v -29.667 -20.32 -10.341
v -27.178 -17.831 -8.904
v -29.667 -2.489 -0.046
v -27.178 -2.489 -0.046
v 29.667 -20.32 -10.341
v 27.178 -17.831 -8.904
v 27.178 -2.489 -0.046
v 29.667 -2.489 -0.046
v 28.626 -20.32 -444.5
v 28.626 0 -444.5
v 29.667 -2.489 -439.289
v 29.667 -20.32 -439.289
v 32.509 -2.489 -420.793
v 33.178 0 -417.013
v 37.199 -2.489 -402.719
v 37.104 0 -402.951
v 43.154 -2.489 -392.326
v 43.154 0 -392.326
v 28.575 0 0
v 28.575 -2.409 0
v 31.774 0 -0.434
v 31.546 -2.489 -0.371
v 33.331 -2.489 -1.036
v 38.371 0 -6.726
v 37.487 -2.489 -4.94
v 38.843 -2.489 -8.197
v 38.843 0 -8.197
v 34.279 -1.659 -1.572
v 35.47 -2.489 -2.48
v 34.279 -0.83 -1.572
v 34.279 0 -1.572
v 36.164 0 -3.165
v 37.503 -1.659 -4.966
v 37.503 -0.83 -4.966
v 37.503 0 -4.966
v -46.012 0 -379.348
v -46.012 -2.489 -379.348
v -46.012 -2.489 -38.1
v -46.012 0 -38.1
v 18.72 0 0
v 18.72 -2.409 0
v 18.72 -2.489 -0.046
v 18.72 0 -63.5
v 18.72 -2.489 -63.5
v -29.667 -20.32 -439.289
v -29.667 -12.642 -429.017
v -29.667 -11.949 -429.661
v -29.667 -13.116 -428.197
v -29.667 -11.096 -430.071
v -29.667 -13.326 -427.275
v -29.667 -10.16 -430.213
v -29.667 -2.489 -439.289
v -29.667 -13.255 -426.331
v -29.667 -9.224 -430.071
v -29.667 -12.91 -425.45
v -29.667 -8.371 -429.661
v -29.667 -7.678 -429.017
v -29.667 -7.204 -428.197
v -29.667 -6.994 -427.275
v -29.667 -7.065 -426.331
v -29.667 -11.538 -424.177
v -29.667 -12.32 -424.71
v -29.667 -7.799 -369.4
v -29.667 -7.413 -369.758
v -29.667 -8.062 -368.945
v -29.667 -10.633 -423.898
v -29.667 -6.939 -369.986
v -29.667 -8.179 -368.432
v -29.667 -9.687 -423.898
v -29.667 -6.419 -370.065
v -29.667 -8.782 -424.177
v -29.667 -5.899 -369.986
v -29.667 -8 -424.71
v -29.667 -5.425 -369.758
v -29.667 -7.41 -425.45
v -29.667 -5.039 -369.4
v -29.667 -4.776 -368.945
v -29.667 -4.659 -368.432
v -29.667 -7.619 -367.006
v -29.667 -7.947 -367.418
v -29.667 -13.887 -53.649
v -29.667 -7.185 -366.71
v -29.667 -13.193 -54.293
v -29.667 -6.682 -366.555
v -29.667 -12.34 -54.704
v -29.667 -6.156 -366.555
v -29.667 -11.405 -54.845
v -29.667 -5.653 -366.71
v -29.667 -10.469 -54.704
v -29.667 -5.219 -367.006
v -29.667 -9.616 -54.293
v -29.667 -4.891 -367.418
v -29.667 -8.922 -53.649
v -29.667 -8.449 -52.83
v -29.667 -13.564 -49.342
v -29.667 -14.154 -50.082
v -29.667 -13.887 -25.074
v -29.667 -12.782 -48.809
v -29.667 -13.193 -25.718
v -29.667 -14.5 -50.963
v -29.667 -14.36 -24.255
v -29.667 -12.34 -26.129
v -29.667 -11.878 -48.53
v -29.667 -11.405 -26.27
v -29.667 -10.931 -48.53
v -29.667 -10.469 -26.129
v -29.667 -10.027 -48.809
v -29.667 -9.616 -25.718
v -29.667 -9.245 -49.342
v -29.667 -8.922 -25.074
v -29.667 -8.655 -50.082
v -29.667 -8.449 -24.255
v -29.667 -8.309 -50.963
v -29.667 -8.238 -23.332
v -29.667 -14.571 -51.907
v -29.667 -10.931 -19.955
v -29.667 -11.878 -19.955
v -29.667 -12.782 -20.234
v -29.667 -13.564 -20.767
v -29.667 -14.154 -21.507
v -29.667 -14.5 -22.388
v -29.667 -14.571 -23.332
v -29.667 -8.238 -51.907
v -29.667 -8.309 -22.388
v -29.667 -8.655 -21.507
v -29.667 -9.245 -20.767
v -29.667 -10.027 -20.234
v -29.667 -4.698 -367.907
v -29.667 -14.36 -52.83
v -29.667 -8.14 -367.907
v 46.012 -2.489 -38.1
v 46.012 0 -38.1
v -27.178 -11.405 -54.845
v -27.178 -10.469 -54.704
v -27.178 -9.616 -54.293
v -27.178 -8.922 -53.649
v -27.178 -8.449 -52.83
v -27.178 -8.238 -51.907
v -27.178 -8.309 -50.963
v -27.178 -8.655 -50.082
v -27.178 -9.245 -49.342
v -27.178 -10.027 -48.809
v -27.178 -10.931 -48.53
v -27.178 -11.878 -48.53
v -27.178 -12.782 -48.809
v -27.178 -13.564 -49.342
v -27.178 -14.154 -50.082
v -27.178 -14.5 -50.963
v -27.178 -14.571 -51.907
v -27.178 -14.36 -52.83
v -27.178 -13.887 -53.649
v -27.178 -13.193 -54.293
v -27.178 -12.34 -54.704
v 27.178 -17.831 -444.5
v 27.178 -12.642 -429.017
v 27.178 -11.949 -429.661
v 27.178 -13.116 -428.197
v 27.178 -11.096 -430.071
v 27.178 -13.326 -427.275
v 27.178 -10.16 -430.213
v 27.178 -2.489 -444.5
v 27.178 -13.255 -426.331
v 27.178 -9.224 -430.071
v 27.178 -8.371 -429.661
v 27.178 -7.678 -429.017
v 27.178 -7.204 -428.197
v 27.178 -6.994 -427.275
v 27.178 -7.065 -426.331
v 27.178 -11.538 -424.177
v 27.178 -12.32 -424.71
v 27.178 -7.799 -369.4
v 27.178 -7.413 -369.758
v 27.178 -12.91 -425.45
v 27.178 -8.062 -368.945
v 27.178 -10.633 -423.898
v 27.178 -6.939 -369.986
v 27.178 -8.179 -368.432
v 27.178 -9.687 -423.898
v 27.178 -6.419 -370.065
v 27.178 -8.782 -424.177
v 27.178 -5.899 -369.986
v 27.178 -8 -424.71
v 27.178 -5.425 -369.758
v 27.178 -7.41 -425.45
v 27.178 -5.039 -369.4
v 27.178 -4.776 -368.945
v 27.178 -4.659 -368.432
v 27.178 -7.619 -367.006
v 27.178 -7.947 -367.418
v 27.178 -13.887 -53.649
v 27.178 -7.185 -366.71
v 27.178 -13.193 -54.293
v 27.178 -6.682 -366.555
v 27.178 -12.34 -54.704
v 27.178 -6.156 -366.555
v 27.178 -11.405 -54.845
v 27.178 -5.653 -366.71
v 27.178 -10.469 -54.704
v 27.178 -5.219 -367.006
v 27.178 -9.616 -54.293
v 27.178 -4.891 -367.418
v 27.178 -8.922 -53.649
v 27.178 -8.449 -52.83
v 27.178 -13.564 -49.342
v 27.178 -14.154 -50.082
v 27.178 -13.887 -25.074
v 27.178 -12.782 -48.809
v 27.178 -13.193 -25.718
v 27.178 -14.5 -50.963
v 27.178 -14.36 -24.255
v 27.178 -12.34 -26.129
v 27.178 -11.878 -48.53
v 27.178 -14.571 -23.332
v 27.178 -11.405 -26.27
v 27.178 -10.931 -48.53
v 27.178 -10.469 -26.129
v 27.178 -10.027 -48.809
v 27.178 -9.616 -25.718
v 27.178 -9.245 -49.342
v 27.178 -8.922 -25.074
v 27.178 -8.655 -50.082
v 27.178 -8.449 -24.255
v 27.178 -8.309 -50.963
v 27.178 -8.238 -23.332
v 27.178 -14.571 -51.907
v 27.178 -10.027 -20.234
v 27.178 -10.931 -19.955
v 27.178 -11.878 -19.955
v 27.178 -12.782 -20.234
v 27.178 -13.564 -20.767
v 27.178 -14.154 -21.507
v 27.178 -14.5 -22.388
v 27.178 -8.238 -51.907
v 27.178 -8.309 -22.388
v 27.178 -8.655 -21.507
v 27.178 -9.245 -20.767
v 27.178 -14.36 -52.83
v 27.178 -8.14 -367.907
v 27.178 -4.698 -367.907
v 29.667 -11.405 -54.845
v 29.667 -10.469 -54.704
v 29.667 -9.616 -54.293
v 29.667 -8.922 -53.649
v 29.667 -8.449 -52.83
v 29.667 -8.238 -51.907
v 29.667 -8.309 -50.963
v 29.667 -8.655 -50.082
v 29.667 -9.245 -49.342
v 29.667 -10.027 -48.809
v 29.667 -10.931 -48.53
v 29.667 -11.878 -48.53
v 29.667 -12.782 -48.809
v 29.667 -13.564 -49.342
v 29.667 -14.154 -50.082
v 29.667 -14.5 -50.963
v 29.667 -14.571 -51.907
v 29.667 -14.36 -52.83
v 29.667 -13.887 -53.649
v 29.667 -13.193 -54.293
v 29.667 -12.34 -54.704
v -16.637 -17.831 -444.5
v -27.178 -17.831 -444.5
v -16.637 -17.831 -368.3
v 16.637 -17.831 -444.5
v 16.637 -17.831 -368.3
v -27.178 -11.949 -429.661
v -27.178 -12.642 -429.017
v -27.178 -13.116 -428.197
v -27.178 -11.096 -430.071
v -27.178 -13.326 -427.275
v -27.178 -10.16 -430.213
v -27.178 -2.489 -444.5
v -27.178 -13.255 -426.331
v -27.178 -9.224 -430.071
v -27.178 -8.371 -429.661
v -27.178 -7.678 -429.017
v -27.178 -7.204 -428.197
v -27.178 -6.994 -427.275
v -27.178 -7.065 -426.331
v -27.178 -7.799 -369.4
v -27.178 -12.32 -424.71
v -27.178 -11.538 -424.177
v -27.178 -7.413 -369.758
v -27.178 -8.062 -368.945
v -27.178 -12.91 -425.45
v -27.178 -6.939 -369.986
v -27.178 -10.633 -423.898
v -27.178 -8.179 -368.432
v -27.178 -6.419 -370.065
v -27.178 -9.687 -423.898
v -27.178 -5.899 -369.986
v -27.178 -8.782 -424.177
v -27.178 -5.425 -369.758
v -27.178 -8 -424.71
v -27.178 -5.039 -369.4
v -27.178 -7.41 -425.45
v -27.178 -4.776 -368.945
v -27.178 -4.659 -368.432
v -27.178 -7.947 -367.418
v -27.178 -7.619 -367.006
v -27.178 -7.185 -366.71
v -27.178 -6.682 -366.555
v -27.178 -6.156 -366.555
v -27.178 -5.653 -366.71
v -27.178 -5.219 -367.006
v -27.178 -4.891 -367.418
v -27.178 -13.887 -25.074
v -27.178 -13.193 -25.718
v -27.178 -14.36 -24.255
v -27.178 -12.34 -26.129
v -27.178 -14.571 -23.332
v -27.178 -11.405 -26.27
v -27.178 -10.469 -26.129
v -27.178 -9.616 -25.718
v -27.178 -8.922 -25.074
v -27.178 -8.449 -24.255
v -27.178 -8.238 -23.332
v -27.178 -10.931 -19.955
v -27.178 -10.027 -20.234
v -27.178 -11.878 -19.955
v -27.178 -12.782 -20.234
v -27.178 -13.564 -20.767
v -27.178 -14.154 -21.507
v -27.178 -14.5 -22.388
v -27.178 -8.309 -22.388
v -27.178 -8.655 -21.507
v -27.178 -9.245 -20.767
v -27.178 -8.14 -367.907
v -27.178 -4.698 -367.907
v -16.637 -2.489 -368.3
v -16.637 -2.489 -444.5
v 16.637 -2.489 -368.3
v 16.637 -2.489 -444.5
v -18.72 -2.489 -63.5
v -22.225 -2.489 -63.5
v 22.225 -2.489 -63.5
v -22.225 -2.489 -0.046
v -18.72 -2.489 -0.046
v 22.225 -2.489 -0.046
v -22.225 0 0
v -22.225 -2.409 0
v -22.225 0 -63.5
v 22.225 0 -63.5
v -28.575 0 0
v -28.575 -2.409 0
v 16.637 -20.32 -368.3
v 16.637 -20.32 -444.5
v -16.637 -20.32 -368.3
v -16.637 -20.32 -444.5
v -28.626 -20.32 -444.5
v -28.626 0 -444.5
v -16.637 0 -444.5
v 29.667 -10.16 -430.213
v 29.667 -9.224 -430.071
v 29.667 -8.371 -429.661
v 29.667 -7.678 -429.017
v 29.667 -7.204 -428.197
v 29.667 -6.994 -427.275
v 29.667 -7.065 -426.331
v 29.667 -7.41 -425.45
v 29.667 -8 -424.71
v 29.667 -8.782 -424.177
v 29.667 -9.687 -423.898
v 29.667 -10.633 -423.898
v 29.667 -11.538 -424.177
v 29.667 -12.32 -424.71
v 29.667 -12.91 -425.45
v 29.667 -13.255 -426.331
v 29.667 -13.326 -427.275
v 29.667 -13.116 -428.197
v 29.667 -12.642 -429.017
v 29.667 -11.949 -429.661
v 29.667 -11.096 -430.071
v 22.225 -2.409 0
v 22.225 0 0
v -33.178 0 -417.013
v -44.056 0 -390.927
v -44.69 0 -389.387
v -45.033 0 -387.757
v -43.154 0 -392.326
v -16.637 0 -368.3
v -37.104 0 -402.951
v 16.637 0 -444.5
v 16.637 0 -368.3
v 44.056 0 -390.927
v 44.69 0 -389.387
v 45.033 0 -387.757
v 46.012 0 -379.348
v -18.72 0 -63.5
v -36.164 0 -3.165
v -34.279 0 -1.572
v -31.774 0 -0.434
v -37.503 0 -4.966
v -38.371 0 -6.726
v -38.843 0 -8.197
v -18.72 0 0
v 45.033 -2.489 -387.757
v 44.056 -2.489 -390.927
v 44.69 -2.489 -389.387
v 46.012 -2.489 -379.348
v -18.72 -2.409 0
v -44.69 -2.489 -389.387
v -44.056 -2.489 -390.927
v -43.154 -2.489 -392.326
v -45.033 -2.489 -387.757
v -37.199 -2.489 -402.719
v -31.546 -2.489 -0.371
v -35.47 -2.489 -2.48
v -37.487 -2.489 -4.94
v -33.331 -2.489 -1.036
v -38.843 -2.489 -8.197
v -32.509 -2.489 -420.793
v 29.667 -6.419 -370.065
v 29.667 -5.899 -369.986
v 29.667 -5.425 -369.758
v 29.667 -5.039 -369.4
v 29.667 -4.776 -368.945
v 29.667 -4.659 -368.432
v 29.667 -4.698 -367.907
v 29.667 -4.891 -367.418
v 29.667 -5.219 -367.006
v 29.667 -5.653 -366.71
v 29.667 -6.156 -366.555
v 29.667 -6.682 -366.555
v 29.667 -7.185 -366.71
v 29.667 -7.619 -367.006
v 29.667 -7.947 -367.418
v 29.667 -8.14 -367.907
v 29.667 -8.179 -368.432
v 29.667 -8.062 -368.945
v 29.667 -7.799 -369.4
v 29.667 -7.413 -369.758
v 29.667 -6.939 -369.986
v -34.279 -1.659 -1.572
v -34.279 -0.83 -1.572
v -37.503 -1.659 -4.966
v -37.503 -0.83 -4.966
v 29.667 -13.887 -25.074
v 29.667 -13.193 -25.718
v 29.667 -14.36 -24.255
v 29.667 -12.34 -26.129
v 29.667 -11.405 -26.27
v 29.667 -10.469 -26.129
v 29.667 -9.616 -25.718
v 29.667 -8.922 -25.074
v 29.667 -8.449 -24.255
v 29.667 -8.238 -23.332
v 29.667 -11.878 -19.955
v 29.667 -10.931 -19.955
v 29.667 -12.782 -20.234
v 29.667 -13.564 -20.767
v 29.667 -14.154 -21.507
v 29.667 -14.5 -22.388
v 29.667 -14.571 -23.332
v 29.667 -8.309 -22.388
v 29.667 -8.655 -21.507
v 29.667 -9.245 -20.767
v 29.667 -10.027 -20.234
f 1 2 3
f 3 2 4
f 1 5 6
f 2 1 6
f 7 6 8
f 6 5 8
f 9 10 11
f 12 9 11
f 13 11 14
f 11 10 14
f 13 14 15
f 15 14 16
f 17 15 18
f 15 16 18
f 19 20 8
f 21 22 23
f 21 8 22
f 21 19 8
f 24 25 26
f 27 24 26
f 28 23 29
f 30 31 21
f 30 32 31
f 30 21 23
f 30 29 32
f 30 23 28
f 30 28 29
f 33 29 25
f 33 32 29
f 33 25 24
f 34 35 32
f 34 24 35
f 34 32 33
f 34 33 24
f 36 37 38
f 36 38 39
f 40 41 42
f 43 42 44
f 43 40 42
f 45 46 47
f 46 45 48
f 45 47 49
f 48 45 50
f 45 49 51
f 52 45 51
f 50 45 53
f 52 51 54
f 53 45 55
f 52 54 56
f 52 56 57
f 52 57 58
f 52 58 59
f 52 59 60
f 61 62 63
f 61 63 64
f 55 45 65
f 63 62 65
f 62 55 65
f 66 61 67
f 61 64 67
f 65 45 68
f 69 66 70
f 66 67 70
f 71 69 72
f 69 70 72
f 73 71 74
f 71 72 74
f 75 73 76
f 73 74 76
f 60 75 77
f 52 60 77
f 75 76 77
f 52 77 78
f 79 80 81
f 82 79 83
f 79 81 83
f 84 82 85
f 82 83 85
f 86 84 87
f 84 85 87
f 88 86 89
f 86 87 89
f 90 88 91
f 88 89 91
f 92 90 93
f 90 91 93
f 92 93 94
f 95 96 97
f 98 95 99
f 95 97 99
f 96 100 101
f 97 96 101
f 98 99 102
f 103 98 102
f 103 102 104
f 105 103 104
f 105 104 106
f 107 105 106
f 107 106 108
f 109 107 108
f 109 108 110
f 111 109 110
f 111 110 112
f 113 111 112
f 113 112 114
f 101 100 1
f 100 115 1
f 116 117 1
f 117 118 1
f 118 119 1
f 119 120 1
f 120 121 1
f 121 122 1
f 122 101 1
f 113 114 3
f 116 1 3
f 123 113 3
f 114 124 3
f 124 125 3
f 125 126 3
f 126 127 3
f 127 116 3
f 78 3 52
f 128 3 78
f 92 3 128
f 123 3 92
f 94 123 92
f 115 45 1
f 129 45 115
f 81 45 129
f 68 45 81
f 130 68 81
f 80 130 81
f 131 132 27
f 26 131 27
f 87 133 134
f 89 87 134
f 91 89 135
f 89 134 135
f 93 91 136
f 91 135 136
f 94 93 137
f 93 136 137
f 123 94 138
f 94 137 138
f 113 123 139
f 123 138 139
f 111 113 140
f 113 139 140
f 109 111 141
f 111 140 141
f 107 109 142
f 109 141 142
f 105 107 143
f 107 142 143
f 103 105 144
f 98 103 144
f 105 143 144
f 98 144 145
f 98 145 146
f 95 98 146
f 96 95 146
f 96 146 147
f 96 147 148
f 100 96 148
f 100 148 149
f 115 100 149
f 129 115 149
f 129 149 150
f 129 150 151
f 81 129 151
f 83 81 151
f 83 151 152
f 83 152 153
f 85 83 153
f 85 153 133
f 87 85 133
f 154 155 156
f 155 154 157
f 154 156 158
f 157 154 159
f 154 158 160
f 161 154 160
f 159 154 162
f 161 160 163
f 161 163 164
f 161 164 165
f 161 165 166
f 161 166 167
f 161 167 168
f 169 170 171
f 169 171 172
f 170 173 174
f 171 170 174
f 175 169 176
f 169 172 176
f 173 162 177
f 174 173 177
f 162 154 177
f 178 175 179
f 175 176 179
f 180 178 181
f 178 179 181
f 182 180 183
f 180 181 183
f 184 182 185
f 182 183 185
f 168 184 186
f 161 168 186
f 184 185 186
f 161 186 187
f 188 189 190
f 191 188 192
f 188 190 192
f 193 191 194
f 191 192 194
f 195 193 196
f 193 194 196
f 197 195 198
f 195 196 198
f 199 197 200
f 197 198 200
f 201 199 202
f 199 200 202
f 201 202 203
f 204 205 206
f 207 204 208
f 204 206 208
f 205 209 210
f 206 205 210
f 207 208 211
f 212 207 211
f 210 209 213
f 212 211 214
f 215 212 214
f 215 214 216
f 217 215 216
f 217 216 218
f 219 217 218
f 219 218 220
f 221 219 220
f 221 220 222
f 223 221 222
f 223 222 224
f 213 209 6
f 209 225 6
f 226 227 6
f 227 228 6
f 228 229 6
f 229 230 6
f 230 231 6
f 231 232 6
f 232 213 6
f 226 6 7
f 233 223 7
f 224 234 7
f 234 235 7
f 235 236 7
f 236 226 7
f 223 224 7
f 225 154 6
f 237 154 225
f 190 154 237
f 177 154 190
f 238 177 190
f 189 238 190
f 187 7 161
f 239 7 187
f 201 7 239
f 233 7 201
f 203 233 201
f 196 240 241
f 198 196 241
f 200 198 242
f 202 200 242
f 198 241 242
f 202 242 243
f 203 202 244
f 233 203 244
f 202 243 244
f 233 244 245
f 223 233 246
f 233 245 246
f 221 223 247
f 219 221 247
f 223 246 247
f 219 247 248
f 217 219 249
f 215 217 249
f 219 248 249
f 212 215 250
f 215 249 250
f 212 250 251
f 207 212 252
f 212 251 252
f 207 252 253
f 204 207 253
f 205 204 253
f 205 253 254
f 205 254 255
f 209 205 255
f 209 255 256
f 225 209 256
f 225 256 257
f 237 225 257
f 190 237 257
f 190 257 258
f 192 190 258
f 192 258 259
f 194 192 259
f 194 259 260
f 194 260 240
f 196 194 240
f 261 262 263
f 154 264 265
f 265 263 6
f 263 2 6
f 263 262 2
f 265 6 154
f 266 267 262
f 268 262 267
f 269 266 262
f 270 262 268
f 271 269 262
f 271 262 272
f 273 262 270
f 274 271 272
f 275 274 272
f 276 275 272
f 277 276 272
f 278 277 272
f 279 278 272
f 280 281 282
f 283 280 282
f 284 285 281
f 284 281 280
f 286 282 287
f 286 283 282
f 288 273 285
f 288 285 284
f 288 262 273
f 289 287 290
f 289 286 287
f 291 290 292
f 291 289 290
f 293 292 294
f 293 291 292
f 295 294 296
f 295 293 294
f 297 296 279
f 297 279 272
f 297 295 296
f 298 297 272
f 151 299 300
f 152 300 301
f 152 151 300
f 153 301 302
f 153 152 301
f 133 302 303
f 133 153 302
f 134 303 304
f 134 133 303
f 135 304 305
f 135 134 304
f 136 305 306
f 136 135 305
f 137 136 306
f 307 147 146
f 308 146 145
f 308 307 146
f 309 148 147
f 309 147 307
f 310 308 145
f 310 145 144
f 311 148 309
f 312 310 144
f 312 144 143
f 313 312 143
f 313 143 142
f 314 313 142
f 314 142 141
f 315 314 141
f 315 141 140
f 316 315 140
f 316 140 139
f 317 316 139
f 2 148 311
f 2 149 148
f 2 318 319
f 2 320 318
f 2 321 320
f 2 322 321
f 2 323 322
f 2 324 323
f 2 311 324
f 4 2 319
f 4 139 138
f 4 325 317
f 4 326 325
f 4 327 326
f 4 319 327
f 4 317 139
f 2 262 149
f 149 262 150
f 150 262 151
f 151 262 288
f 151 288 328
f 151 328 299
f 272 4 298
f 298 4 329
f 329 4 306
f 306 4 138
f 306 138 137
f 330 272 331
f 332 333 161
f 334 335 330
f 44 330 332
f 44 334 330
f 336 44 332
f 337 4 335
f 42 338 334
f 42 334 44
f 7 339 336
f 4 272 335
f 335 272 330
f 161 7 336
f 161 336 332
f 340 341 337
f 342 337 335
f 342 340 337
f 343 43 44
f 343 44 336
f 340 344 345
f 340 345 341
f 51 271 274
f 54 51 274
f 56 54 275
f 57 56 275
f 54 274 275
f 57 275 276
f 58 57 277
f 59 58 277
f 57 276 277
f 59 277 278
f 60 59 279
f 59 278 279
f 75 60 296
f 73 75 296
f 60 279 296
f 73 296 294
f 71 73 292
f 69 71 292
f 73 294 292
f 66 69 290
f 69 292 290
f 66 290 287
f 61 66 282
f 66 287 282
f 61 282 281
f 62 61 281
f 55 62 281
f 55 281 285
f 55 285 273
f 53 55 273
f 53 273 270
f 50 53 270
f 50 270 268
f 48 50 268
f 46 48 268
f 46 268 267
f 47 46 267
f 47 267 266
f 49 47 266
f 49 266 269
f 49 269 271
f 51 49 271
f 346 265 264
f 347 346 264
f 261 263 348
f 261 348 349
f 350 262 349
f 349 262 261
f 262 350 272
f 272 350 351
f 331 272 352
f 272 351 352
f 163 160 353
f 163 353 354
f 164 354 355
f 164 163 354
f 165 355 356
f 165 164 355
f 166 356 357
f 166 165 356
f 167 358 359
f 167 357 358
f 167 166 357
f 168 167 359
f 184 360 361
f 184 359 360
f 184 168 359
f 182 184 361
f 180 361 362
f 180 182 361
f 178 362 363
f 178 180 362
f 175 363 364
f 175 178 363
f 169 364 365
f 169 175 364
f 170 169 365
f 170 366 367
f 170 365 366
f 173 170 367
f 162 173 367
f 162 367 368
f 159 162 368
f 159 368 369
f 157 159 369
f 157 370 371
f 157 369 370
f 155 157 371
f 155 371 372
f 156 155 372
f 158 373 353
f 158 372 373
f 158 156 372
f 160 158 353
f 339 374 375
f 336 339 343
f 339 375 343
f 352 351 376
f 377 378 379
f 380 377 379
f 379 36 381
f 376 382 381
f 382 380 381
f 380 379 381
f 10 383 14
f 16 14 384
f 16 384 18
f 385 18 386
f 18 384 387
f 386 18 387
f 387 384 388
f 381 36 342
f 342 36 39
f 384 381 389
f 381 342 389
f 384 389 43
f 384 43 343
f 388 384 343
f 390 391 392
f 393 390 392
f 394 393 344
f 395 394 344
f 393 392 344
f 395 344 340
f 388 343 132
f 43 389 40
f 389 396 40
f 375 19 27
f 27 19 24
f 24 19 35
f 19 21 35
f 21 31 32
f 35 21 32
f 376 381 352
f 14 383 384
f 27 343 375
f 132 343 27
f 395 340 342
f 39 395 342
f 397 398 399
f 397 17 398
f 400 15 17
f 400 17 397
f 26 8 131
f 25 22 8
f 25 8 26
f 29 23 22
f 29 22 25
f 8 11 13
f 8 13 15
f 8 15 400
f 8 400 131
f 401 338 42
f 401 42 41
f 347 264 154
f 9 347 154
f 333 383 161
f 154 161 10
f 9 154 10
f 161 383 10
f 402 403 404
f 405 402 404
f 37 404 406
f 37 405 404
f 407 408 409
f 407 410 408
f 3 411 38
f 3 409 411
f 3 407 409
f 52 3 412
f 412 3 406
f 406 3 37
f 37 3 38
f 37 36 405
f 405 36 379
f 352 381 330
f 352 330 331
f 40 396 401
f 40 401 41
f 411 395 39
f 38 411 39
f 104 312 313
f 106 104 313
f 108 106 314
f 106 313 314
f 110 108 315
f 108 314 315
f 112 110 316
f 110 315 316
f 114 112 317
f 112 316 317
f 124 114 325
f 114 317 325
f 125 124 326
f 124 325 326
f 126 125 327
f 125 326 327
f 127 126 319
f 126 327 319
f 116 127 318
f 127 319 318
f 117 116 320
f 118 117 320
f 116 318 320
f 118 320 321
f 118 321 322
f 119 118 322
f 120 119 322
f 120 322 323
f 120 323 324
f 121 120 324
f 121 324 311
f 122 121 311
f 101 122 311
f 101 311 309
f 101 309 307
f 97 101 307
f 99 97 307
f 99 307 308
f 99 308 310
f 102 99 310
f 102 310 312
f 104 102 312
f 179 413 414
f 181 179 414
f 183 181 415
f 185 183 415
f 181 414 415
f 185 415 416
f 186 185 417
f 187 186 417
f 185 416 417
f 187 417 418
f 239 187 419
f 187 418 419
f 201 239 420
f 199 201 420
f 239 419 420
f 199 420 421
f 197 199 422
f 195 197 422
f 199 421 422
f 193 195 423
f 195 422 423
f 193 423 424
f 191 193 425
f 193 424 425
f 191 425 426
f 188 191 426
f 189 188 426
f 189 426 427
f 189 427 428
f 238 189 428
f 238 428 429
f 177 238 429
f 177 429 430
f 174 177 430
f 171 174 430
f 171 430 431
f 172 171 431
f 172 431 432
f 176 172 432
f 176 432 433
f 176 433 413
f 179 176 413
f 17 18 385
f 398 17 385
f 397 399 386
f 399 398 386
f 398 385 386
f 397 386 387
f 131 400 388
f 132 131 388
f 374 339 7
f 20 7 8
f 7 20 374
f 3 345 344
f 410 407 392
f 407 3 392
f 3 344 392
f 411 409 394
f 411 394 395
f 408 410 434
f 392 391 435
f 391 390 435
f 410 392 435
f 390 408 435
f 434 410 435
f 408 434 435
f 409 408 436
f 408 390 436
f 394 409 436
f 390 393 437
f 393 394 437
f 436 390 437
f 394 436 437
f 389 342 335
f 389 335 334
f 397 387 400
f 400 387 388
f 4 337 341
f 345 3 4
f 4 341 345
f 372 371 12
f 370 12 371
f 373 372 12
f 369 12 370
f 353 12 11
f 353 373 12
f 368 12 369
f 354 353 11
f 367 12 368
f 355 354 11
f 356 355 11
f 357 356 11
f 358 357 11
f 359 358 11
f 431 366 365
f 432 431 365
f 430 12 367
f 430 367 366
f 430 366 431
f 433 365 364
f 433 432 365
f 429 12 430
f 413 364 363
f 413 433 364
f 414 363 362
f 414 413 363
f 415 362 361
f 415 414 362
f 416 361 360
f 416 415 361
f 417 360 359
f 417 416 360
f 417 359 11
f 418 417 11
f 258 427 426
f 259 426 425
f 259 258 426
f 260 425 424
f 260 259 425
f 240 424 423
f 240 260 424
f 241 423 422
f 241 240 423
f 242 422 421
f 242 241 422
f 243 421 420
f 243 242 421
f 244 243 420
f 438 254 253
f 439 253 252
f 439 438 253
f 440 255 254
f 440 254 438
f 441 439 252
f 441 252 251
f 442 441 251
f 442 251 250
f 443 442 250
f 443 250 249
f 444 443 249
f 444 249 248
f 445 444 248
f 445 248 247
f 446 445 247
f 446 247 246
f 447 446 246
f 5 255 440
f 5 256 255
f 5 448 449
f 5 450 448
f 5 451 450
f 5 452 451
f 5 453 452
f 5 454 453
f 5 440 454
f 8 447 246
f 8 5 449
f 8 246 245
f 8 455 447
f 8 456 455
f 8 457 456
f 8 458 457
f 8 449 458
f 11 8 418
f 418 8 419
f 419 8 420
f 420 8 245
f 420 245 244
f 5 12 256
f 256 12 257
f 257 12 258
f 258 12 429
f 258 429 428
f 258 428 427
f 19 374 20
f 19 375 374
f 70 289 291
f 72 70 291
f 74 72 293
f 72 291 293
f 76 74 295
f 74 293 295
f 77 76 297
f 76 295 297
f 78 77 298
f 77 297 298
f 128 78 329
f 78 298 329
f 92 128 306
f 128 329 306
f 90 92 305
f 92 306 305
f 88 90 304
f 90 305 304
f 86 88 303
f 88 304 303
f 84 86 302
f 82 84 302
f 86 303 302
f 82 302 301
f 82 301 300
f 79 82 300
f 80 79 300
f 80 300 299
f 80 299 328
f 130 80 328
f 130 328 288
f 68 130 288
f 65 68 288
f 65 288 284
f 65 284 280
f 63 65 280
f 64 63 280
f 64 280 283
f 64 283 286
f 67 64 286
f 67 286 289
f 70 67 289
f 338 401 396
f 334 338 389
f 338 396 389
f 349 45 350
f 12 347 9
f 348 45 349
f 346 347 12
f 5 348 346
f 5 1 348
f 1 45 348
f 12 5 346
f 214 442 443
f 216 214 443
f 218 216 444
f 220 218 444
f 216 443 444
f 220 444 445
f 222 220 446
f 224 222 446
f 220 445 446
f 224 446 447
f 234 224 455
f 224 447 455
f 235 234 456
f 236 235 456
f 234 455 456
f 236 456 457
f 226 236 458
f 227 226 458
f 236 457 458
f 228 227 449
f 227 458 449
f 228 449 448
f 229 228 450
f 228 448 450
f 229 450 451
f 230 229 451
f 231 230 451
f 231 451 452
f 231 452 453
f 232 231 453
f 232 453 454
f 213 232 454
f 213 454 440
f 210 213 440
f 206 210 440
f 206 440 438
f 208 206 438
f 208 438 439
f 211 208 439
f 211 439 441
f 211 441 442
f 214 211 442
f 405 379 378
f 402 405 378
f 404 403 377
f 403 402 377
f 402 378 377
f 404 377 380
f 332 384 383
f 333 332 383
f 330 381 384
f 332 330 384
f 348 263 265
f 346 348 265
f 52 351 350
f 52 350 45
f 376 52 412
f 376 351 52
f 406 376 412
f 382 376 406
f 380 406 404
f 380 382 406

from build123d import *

# Parameters (mm, degrees)
SKETCH1_W               = 92.0242
SKETCH1_H               = 20.32
BOSS_EXTRUDE1_DEPTH     = 444.5
SKETCH2_W               = 54.356
SKETCH2_H               = 15.3416
SKETCH2_W_2             = 16.3449
SKETCH2_H_2             = 17.8308
CUT_EXTRUDE1_DEPTH      = 445.5
SKETCH3_W               = 33.274
SKETCH3_H               = 76.2
CUT_EXTRUDE2_DEPTH      = 21.32
SKETCH4_W               = 3.5052
SKETCH4_H               = 63.5
CUT_EXTRUDE3_DEPTH      = 12.7
CUT_EXTRUDE5_DEPTH      = 76.6793001
SKETCH6_R               = 3.175
CUT_EXTRUDE6_DEPTH      = 76.6793001
SKETCH7_R               = 1.764906423
CUT_EXTRUDE7_DEPTH      = 76.6793001
SKETCH9_R               = 3.175
CUT_EXTRUDE8_DEPTH      = 47.0121001
CUT_EXTRUDE8_DEPTH_BACK = 47.0121001


with BuildPart() as part:
    # Sketch1 → Boss-Extrude1 (new body)
    with BuildSketch(Plane.XY):
        with Locations((0, -10.16)):
            Rectangle(SKETCH1_W, SKETCH1_H)
    extrude(amount=-BOSS_EXTRUDE1_DEPTH)

    # Sketch2 → Cut-Extrude1 (cut, through all)
    with BuildSketch(Plane.XY):
        with Locations((0, -10.16)):
            Rectangle(SKETCH2_W, SKETCH2_H)
        with Locations((37.83965, -11.4046)):
            Rectangle(SKETCH2_W_2, SKETCH2_H_2)
        with Locations((-37.83965, -11.4046)):
            Rectangle(SKETCH2_W_2, SKETCH2_H_2)
    extrude(amount=-CUT_EXTRUDE1_DEPTH, mode=Mode.SUBTRACT)

    # Sketch3 → Cut-Extrude2 (cut, through all)
    with BuildSketch(Plane(origin=(0, 0, 0), x_dir=(1, 0, 0), z_dir=(0, 1, 0))):
        with BuildLine():
            Line((-46.0121, 0), (-28.575, 0))
            add(Edge.make_bspline(
                [(-28.575, 0), (-35.717859011, 0), (-38.245794082, 5.707856621), (-38.842625262, 8.197153509)],
                knots=[0, 0, 0, 0, 1, 1, 1, 1], degree=3))
            Line((-38.842625262, 8.197153509), (-46.0121, 38.1))
            Line((-46.0121, 38.1), (-46.0121, 0))
        make_face()
        with BuildLine():
            add(Edge.make_bspline(
                [(28.575, 0), (35.717859011, 0), (38.245794082, 5.707856621), (38.842625262, 8.197153509)],
                knots=[0, 0, 0, 0, 1, 1, 1, 1], degree=3))
            Line((28.575, 0), (46.0121, 0))
            Line((46.0121, 0), (46.0121, 38.1))
            Line((46.0121, 38.1), (38.842625262, 8.197153509))
        make_face()
        with BuildLine():
            Line((46.0121, 444.5), (28.6258, 444.5))
            add(Edge.make_bspline(
                [(28.6258, 444.5), (32.693382337, 426.337896511), (31.854875968, 406.755772808), (43.153705429, 392.326383256)],
                knots=[0, 0, 0, 0, 0.951264786, 0.951264786, 0.951264786, 0.951264786], degree=3))
            ThreePointArc((43.153705429, 392.326383256), (44.408270339, 390.171508327), (45.032534863, 387.757442695))
            Line((45.032534863, 387.757442695), (46.0121, 379.348138392))
            Line((46.0121, 379.348138392), (46.0121, 444.5))
        make_face()
        with Locations((0, 406.4)):
            Rectangle(SKETCH3_W, SKETCH3_H)
        with BuildLine():
            add(Edge.make_bspline(
                [(-28.6258, 444.5), (-32.693382337, 426.337896511), (-31.854875968, 406.755772808), (-43.153705429, 392.326383256)],
                knots=[0, 0, 0, 0, 0.951264786, 0.951264786, 0.951264786, 0.951264786], degree=3))
            Line((-28.6258, 444.5), (-46.0121, 444.5))
            Line((-46.0121, 444.5), (-46.0121, 379.348138392))
            Line((-46.0121, 379.348138392), (-45.032534863, 387.757442695))
            ThreePointArc((-45.032534863, 387.757442695), (-44.408270339, 390.171508327), (-43.153705429, 392.326383256))
        make_face()
    extrude(amount=-CUT_EXTRUDE2_DEPTH, mode=Mode.SUBTRACT)

    # Sketch4 → Cut-Extrude3 (cut)
    with BuildSketch(Plane(origin=(0, 0, 0), x_dir=(1, 0, 0), z_dir=(0, 1, 0))):
        with Locations((20.4724, 31.75)):
            Rectangle(SKETCH4_W, SKETCH4_H)
        with Locations((-20.4724, 31.75)):
            Rectangle(SKETCH4_W, SKETCH4_H)
    extrude(amount=-CUT_EXTRUDE3_DEPTH, mode=Mode.SUBTRACT)

    # Sketch5 → Cut-Extrude5 (cut, through all)
    with BuildSketch(Plane(origin=(29.6672, 0, 0), x_dir=(0, 0, -1), z_dir=(1, 0, 0))):
        Polygon((0.046334806, -2.4892), (-3.084672114, 2.933863065), (-3.084672114, -20.32), (0.046334806, -20.32), align=None)
        Polygon((10.340951986, -20.32), (0.046334806, -2.4892), (0.046334806, -20.32), align=None)
    extrude(amount=-CUT_EXTRUDE5_DEPTH, mode=Mode.SUBTRACT)

    # Sketch6 → Cut-Extrude6 (cut, through all)
    with BuildSketch(Plane(origin=(29.6672, 0, 0), x_dir=(0, 0, -1), z_dir=(1, 0, 0))):
        with Locations((23.09476437, -11.4046)):
            Circle(SKETCH6_R)
        with Locations((51.66976437, -11.4046)):
            Circle(SKETCH6_R)
    extrude(amount=-CUT_EXTRUDE6_DEPTH, mode=Mode.SUBTRACT)

    # Sketch7 → Cut-Extrude7 (cut, through all)
    with BuildSketch(Plane(origin=(29.6672, 0, 0), x_dir=(0, 0, -1), z_dir=(1, 0, 0))):
        with Locations((368.3, -6.418973604)):
            Circle(SKETCH7_R)
    extrude(amount=-CUT_EXTRUDE7_DEPTH, mode=Mode.SUBTRACT)

    # Sketch9 → Cut-Extrude8 (cut, two sides)
    with BuildSketch(Plane(origin=(0, 0, 0), x_dir=(0, 0, -1), z_dir=(1, 0, 0))) as cut_extrude8_sk:
        with Locations((427.0375, -10.16)):
            Circle(SKETCH9_R)
    extrude(amount=CUT_EXTRUDE8_DEPTH, mode=Mode.SUBTRACT)
    extrude(cut_extrude8_sk.sketch, amount=-CUT_EXTRUDE8_DEPTH_BACK, mode=Mode.SUBTRACT)


solid = part.part
